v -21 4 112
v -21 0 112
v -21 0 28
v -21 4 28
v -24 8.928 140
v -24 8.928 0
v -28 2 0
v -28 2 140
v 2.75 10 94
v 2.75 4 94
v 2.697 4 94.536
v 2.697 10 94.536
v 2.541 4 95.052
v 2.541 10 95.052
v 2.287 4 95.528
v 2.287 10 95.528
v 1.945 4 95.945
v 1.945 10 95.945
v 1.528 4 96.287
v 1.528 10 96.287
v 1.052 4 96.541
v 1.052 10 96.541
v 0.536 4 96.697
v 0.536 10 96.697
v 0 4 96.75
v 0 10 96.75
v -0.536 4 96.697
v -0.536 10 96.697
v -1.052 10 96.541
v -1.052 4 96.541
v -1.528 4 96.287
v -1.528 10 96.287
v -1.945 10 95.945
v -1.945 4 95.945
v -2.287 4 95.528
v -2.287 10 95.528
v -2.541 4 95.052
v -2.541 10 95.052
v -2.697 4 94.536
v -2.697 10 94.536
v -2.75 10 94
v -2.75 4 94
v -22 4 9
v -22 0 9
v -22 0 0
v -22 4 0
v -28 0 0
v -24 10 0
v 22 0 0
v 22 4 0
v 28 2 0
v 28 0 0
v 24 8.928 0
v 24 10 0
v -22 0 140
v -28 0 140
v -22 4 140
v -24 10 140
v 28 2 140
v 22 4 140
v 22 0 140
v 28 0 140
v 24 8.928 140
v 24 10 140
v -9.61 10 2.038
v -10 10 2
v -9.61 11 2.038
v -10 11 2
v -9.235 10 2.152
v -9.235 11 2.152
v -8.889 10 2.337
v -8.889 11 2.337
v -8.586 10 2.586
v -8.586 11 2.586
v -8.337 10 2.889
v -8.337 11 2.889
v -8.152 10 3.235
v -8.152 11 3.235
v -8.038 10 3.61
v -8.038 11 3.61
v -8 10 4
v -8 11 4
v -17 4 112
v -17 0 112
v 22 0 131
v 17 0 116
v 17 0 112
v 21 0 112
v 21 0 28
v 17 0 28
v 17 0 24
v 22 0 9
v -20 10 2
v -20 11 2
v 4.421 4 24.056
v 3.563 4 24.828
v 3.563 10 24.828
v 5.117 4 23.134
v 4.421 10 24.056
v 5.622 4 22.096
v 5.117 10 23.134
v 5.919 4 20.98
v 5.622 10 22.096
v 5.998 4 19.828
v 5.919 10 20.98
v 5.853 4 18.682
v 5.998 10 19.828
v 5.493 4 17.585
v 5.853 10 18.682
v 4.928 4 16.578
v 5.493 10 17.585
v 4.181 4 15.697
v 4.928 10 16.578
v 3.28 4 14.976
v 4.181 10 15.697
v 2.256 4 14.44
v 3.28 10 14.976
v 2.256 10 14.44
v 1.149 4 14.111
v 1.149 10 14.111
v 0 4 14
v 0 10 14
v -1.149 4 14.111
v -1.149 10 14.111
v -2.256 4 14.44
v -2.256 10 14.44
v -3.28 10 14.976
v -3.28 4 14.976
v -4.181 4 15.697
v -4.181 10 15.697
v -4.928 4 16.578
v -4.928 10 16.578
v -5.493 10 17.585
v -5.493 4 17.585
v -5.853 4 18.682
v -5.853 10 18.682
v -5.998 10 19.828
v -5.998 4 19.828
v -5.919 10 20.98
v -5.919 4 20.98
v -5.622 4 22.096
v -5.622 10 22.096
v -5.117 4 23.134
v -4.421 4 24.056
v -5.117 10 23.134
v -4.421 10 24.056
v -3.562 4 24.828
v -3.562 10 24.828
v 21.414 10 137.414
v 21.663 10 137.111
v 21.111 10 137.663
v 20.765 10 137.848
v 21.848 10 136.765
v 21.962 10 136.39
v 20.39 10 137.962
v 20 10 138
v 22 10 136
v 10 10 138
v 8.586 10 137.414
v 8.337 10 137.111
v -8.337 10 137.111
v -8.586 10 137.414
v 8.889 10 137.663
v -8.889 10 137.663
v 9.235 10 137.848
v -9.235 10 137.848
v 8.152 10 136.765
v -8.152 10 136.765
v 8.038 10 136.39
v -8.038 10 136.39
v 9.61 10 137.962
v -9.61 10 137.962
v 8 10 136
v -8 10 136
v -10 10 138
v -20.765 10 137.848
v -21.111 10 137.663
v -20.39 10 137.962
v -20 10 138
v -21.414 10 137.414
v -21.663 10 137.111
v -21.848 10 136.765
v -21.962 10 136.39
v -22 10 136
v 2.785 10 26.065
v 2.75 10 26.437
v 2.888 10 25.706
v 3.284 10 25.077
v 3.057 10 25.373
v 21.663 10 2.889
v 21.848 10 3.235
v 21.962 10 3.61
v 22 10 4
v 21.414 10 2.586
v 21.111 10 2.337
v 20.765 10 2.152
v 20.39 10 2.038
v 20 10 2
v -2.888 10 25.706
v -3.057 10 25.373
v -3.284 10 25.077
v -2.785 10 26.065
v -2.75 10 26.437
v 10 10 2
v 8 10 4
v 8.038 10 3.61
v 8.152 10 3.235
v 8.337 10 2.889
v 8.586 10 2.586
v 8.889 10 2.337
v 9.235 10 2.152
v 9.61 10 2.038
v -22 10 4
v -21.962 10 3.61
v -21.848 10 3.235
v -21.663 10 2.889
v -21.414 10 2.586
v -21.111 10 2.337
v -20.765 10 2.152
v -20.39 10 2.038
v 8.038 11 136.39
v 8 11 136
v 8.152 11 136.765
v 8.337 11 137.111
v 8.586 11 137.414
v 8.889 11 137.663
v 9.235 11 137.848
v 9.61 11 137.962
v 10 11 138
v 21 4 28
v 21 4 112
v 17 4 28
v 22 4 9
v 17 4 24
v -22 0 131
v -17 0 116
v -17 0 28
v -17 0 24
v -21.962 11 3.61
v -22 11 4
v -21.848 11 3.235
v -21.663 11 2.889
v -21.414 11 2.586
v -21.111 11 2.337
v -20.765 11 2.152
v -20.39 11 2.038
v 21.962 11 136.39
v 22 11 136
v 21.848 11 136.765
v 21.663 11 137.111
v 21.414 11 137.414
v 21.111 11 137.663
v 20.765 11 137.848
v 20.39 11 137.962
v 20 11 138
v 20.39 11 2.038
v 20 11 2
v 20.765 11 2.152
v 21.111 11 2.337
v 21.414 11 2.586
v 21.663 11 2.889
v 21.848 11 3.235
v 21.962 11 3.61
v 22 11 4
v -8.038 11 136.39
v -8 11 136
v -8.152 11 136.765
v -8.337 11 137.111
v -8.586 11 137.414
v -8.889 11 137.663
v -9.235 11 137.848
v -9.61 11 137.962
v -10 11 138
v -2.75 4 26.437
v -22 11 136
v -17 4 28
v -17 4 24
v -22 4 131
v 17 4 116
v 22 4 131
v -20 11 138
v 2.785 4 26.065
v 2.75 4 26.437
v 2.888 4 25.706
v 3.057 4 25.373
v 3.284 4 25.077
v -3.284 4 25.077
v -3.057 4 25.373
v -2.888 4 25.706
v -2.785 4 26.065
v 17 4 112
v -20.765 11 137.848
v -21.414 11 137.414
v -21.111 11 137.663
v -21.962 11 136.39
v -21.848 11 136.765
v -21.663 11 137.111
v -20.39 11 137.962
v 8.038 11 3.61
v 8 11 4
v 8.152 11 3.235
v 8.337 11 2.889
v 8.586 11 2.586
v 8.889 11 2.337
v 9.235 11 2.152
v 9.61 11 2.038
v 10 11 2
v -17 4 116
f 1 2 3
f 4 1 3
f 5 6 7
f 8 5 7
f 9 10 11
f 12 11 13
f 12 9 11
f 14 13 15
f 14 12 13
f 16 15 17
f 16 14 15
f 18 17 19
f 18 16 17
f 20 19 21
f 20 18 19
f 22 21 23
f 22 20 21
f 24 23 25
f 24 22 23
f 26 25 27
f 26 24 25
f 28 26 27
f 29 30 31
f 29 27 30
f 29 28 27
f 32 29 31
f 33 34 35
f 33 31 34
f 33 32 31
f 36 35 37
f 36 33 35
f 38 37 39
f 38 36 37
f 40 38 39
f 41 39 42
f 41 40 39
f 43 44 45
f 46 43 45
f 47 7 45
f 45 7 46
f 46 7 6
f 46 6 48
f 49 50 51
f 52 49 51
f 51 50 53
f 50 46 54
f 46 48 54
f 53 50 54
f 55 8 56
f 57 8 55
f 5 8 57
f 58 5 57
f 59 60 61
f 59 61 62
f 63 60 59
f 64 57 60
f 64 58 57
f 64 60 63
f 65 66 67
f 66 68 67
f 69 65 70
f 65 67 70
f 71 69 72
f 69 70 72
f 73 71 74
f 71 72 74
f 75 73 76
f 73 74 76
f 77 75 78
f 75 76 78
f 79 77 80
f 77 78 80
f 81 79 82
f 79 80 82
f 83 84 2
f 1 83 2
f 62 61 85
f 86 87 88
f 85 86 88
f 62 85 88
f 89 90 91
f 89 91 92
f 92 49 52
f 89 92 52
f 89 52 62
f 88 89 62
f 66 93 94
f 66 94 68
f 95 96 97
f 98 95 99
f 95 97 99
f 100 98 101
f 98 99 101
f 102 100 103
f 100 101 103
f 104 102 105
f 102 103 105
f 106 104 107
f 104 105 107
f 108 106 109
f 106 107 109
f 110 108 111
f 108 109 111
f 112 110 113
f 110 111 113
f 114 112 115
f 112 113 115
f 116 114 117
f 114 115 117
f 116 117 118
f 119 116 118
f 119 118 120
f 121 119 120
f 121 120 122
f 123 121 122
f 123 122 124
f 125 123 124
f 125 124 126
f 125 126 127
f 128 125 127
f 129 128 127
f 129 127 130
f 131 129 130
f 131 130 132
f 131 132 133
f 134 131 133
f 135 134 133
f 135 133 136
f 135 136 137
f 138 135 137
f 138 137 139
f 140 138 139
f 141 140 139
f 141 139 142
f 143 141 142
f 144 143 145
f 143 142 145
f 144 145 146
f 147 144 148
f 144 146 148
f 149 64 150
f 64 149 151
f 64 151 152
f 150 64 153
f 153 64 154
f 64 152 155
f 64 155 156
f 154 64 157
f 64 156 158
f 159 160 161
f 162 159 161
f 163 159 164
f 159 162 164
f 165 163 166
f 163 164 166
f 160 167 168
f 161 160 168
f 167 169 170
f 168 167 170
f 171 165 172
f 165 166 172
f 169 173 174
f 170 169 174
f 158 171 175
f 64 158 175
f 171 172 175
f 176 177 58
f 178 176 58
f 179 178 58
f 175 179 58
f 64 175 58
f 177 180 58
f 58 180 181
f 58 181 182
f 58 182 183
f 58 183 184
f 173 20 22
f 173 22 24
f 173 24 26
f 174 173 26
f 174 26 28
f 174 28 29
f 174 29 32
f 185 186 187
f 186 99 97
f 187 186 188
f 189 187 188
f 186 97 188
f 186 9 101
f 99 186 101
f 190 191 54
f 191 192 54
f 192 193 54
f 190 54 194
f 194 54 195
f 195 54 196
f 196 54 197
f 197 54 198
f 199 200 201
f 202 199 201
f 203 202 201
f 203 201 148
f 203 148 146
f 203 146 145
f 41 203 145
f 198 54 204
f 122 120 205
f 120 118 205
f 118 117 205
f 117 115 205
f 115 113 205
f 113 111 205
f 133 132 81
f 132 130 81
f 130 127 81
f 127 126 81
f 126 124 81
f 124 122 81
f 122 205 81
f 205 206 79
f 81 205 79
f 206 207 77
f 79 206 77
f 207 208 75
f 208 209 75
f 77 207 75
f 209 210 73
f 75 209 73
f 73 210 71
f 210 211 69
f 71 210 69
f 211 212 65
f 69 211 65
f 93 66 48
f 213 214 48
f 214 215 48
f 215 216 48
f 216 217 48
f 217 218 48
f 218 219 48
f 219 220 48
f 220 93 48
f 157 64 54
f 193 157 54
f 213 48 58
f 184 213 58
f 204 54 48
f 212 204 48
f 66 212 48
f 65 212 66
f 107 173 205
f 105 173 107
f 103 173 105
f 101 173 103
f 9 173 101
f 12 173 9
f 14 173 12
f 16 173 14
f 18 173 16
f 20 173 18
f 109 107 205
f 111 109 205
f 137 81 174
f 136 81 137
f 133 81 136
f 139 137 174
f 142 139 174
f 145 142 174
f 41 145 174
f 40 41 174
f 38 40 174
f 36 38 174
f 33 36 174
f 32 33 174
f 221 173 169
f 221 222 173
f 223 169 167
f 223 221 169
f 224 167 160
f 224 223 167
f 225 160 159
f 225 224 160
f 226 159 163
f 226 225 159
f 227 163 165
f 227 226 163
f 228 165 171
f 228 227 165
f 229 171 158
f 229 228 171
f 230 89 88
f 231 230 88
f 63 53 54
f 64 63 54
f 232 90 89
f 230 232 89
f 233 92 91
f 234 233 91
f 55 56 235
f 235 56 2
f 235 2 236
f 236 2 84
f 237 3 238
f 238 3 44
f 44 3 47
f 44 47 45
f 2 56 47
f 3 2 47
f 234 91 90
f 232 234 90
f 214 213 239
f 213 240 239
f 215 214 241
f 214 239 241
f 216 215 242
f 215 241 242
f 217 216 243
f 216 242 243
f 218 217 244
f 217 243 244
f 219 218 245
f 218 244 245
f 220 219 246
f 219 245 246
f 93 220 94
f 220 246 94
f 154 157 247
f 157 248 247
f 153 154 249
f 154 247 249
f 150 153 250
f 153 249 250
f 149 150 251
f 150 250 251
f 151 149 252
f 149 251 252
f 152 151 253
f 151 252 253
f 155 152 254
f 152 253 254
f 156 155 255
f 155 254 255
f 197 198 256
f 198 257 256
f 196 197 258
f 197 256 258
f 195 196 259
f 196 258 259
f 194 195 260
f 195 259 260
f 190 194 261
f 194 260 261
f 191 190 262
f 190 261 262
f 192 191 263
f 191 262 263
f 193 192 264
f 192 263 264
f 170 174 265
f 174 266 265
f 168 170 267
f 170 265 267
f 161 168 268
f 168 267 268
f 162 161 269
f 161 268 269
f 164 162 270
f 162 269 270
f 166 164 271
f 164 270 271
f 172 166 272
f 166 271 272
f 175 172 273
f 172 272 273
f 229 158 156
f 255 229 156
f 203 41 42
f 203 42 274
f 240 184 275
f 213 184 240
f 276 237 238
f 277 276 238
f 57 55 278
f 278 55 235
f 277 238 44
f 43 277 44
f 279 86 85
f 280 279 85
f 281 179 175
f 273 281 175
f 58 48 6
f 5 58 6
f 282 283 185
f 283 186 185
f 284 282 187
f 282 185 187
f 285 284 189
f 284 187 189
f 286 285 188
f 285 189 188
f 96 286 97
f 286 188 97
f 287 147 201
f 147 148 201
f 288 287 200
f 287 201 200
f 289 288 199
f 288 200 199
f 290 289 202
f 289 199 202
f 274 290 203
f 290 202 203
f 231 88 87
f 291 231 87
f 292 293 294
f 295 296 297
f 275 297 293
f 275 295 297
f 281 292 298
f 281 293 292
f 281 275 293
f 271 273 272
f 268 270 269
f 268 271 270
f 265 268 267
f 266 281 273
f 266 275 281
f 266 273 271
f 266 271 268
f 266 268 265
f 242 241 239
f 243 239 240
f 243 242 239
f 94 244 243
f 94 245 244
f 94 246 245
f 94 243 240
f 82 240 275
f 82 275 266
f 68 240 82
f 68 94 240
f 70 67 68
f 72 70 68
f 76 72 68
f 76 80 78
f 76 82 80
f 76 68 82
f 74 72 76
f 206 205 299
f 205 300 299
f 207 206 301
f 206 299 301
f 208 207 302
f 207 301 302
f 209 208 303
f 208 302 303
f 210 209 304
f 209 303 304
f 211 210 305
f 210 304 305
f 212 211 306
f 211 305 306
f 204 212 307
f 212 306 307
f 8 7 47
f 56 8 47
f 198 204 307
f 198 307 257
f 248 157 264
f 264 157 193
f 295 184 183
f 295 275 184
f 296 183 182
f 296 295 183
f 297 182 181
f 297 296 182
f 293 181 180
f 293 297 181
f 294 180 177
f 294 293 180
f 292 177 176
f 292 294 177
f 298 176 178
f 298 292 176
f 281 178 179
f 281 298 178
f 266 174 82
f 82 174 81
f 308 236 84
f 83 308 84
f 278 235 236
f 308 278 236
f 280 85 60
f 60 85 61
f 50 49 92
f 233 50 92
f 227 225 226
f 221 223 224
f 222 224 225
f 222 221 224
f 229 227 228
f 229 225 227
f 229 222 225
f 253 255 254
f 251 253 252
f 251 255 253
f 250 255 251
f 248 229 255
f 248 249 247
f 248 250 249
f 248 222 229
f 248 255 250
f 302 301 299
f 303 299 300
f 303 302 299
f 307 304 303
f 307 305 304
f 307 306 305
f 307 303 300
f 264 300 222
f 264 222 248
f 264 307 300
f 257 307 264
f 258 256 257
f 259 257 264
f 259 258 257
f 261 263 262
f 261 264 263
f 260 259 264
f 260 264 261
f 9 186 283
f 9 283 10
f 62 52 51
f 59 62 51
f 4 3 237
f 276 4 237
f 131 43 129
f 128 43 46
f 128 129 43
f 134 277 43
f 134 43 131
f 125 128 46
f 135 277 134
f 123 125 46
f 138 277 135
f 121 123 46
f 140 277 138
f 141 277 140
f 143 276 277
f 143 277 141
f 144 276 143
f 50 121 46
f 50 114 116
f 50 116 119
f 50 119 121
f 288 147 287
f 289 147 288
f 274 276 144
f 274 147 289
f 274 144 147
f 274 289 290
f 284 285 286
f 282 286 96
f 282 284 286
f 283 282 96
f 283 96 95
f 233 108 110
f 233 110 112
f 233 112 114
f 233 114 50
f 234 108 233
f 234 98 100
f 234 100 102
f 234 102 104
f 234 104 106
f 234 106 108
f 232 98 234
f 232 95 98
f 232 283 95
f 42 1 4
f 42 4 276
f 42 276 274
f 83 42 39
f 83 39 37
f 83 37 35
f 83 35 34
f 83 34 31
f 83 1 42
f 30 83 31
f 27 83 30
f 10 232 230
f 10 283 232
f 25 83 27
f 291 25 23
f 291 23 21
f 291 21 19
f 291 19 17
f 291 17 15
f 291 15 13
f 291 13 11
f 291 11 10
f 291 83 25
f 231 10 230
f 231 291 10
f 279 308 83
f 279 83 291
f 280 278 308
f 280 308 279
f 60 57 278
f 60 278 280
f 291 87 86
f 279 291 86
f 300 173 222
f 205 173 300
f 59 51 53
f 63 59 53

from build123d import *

# Parameters (mm, degrees)
EXTRUDE_1_DEPTH     = 140
CUT_EXTRUDE_1_DEPTH = 4
CUT_EXTRUDE_2_DEPTH = 11
SKETCH_4_R          = 6
CUT_EXTRUDE_3_DEPTH = 11
SKETCH_5_W          = 14
SKETCH_5_H          = 136
EXTRUDE_2_DEPTH     = 1
FILLET_1_R          = 2


with BuildPart() as part:
    # Эскиз1 → Бобышка-Вытянуть1 (new body)
    with BuildSketch(Plane.XY):
        Polygon((-28, 0), (28, 0), (28, 2), (24, 8.92820323), (24, 10), (-24, 10), (-24, 8.92820323), (-28, 2), align=None)
    extrude(amount=EXTRUDE_1_DEPTH)

    # Эскиз2 → Вырез-Вытянуть1 (cut)
    with BuildSketch(Plane.XZ):
        Polygon((-22, 140), (-22, 131), (-17, 116), (-17, 112), (-21, 112), (-21, 28), (-17, 28), (-17, 24), (-22, 9), (-22, 0), (22, 0), (22, 9), (17, 24), (17, 28), (21, 28), (21, 112), (17, 112), (17, 116), (22, 131), (22, 140), align=None)
    extrude(amount=-CUT_EXTRUDE_1_DEPTH, mode=Mode.SUBTRACT)

    # Эскиз3 → Вырез-Вытянуть2 (cut, through all)
    with BuildSketch(Plane(origin=(0, 10, 0), x_dir=(1, 0, 0), z_dir=(0, 1, 0))):
        with BuildLine():
            Line((2.75, -20), (2.75, -94))
            ThreePointArc((2.75, -94), (0, -96.75), (-2.75, -94))
            Line((-2.75, -94), (-2.75, -20))
            ThreePointArc((-2.75, -20), (0, -17.25), (2.75, -20))
        make_face()
    extrude(amount=-CUT_EXTRUDE_2_DEPTH, mode=Mode.SUBTRACT)

    # Эскиз4 → Вырез-Вытянуть3 (cut, through all)
    with BuildSketch(Plane(origin=(0, 10, 0), x_dir=(1, 0, 0), z_dir=(0, 1, 0))):
        with Locations((0, -20)):
            Circle(SKETCH_4_R)
    extrude(amount=-CUT_EXTRUDE_3_DEPTH, mode=Mode.SUBTRACT)

    # Эскиз5 → Бобышка-Вытянуть2 (add)
    with BuildSketch(Plane(origin=(0, 10, 0), x_dir=(1, 0, 0), z_dir=(0, 1, 0))):
        with Locations((15, -70)):
            Rectangle(SKETCH_5_W, SKETCH_5_H)
        with Locations((-15, -70)):
            Rectangle(SKETCH_5_W, SKETCH_5_H)
    extrude(amount=EXTRUDE_2_DEPTH)

    # Скругление1
    fillet_1_edges = [part.edges().sort_by_distance(p)[0] for p in [
        (2.75, 7, 25.332682252),
        (-8, 10.5, 138),
        (-8, 10.5, 2),
        (-22, 10.5, 2),
        (-22, 10.5, 138),
        (22, 10.5, 138),
        (22, 10.5, 2),
        (8, 10.5, 2),
        (8, 10.5, 138),
        (-2.75, 7, 25.332682252),
    ]]
    fillet(fillet_1_edges, radius=FILLET_1_R)


solid = part.part
